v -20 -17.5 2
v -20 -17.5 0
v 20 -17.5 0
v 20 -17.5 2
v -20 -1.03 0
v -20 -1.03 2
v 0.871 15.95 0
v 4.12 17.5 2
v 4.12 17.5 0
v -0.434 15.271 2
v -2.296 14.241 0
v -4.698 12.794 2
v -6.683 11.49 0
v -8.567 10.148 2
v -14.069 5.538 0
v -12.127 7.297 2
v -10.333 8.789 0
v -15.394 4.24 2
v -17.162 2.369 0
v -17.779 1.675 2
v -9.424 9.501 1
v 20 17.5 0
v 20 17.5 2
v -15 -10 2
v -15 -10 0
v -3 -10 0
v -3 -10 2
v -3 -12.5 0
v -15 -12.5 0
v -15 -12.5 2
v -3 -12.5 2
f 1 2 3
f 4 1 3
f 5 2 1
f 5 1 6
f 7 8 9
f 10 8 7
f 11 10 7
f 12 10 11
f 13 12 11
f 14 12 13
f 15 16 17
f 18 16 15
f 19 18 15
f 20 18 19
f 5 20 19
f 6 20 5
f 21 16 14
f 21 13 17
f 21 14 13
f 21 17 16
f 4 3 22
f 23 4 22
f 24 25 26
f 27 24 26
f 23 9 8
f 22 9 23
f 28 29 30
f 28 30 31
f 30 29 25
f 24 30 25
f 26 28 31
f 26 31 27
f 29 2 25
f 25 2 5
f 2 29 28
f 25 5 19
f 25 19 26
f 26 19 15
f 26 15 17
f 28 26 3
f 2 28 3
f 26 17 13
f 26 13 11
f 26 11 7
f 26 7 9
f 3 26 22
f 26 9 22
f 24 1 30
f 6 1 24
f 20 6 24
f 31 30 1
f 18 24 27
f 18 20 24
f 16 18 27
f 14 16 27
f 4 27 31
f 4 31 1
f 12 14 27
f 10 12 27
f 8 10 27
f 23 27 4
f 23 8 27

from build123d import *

# Parameters (mm, degrees)
ESQUISSE1_W             = 40
ESQUISSE1_H             = 35
ESQUISSE1_W_2           = 12
ESQUISSE1_H_2           = 2.5
BOSS_EXTRU_1_DEPTH      = 2
ENL_V_MAT_EXTRU_1_DEPTH = 10


with BuildPart() as part:
    # Esquisse1 → Boss.-Extru.1 (new body)
    with BuildSketch(Plane.XY):
        Rectangle(ESQUISSE1_W, ESQUISSE1_H)
        with Locations((-9, -11.25)):
            Rectangle(ESQUISSE1_W_2, ESQUISSE1_H_2, mode=Mode.SUBTRACT)
    extrude(amount=BOSS_EXTRU_1_DEPTH)

    # Esquisse2 → Enlèv. mat.-Extru.1 (cut)
    with BuildSketch(Plane.XY.offset(2)):
        with BuildLine():
            Line((-28.997409478, -17.623933779), (-30.265364491, 23.868234326))
            Line((-30.265364491, 23.868234326), (4.12, 17.5))
            add(Edge.make_bspline(
                [(4.12, 17.5), (-20.235504114, 6.589370836), (-28.997409478, -17.623933779)],
                knots=[0, 0, 0, 1, 1, 1], degree=2))
        make_face()
    extrude(amount=-ENL_V_MAT_EXTRU_1_DEPTH, mode=Mode.SUBTRACT)


solid = part.part
